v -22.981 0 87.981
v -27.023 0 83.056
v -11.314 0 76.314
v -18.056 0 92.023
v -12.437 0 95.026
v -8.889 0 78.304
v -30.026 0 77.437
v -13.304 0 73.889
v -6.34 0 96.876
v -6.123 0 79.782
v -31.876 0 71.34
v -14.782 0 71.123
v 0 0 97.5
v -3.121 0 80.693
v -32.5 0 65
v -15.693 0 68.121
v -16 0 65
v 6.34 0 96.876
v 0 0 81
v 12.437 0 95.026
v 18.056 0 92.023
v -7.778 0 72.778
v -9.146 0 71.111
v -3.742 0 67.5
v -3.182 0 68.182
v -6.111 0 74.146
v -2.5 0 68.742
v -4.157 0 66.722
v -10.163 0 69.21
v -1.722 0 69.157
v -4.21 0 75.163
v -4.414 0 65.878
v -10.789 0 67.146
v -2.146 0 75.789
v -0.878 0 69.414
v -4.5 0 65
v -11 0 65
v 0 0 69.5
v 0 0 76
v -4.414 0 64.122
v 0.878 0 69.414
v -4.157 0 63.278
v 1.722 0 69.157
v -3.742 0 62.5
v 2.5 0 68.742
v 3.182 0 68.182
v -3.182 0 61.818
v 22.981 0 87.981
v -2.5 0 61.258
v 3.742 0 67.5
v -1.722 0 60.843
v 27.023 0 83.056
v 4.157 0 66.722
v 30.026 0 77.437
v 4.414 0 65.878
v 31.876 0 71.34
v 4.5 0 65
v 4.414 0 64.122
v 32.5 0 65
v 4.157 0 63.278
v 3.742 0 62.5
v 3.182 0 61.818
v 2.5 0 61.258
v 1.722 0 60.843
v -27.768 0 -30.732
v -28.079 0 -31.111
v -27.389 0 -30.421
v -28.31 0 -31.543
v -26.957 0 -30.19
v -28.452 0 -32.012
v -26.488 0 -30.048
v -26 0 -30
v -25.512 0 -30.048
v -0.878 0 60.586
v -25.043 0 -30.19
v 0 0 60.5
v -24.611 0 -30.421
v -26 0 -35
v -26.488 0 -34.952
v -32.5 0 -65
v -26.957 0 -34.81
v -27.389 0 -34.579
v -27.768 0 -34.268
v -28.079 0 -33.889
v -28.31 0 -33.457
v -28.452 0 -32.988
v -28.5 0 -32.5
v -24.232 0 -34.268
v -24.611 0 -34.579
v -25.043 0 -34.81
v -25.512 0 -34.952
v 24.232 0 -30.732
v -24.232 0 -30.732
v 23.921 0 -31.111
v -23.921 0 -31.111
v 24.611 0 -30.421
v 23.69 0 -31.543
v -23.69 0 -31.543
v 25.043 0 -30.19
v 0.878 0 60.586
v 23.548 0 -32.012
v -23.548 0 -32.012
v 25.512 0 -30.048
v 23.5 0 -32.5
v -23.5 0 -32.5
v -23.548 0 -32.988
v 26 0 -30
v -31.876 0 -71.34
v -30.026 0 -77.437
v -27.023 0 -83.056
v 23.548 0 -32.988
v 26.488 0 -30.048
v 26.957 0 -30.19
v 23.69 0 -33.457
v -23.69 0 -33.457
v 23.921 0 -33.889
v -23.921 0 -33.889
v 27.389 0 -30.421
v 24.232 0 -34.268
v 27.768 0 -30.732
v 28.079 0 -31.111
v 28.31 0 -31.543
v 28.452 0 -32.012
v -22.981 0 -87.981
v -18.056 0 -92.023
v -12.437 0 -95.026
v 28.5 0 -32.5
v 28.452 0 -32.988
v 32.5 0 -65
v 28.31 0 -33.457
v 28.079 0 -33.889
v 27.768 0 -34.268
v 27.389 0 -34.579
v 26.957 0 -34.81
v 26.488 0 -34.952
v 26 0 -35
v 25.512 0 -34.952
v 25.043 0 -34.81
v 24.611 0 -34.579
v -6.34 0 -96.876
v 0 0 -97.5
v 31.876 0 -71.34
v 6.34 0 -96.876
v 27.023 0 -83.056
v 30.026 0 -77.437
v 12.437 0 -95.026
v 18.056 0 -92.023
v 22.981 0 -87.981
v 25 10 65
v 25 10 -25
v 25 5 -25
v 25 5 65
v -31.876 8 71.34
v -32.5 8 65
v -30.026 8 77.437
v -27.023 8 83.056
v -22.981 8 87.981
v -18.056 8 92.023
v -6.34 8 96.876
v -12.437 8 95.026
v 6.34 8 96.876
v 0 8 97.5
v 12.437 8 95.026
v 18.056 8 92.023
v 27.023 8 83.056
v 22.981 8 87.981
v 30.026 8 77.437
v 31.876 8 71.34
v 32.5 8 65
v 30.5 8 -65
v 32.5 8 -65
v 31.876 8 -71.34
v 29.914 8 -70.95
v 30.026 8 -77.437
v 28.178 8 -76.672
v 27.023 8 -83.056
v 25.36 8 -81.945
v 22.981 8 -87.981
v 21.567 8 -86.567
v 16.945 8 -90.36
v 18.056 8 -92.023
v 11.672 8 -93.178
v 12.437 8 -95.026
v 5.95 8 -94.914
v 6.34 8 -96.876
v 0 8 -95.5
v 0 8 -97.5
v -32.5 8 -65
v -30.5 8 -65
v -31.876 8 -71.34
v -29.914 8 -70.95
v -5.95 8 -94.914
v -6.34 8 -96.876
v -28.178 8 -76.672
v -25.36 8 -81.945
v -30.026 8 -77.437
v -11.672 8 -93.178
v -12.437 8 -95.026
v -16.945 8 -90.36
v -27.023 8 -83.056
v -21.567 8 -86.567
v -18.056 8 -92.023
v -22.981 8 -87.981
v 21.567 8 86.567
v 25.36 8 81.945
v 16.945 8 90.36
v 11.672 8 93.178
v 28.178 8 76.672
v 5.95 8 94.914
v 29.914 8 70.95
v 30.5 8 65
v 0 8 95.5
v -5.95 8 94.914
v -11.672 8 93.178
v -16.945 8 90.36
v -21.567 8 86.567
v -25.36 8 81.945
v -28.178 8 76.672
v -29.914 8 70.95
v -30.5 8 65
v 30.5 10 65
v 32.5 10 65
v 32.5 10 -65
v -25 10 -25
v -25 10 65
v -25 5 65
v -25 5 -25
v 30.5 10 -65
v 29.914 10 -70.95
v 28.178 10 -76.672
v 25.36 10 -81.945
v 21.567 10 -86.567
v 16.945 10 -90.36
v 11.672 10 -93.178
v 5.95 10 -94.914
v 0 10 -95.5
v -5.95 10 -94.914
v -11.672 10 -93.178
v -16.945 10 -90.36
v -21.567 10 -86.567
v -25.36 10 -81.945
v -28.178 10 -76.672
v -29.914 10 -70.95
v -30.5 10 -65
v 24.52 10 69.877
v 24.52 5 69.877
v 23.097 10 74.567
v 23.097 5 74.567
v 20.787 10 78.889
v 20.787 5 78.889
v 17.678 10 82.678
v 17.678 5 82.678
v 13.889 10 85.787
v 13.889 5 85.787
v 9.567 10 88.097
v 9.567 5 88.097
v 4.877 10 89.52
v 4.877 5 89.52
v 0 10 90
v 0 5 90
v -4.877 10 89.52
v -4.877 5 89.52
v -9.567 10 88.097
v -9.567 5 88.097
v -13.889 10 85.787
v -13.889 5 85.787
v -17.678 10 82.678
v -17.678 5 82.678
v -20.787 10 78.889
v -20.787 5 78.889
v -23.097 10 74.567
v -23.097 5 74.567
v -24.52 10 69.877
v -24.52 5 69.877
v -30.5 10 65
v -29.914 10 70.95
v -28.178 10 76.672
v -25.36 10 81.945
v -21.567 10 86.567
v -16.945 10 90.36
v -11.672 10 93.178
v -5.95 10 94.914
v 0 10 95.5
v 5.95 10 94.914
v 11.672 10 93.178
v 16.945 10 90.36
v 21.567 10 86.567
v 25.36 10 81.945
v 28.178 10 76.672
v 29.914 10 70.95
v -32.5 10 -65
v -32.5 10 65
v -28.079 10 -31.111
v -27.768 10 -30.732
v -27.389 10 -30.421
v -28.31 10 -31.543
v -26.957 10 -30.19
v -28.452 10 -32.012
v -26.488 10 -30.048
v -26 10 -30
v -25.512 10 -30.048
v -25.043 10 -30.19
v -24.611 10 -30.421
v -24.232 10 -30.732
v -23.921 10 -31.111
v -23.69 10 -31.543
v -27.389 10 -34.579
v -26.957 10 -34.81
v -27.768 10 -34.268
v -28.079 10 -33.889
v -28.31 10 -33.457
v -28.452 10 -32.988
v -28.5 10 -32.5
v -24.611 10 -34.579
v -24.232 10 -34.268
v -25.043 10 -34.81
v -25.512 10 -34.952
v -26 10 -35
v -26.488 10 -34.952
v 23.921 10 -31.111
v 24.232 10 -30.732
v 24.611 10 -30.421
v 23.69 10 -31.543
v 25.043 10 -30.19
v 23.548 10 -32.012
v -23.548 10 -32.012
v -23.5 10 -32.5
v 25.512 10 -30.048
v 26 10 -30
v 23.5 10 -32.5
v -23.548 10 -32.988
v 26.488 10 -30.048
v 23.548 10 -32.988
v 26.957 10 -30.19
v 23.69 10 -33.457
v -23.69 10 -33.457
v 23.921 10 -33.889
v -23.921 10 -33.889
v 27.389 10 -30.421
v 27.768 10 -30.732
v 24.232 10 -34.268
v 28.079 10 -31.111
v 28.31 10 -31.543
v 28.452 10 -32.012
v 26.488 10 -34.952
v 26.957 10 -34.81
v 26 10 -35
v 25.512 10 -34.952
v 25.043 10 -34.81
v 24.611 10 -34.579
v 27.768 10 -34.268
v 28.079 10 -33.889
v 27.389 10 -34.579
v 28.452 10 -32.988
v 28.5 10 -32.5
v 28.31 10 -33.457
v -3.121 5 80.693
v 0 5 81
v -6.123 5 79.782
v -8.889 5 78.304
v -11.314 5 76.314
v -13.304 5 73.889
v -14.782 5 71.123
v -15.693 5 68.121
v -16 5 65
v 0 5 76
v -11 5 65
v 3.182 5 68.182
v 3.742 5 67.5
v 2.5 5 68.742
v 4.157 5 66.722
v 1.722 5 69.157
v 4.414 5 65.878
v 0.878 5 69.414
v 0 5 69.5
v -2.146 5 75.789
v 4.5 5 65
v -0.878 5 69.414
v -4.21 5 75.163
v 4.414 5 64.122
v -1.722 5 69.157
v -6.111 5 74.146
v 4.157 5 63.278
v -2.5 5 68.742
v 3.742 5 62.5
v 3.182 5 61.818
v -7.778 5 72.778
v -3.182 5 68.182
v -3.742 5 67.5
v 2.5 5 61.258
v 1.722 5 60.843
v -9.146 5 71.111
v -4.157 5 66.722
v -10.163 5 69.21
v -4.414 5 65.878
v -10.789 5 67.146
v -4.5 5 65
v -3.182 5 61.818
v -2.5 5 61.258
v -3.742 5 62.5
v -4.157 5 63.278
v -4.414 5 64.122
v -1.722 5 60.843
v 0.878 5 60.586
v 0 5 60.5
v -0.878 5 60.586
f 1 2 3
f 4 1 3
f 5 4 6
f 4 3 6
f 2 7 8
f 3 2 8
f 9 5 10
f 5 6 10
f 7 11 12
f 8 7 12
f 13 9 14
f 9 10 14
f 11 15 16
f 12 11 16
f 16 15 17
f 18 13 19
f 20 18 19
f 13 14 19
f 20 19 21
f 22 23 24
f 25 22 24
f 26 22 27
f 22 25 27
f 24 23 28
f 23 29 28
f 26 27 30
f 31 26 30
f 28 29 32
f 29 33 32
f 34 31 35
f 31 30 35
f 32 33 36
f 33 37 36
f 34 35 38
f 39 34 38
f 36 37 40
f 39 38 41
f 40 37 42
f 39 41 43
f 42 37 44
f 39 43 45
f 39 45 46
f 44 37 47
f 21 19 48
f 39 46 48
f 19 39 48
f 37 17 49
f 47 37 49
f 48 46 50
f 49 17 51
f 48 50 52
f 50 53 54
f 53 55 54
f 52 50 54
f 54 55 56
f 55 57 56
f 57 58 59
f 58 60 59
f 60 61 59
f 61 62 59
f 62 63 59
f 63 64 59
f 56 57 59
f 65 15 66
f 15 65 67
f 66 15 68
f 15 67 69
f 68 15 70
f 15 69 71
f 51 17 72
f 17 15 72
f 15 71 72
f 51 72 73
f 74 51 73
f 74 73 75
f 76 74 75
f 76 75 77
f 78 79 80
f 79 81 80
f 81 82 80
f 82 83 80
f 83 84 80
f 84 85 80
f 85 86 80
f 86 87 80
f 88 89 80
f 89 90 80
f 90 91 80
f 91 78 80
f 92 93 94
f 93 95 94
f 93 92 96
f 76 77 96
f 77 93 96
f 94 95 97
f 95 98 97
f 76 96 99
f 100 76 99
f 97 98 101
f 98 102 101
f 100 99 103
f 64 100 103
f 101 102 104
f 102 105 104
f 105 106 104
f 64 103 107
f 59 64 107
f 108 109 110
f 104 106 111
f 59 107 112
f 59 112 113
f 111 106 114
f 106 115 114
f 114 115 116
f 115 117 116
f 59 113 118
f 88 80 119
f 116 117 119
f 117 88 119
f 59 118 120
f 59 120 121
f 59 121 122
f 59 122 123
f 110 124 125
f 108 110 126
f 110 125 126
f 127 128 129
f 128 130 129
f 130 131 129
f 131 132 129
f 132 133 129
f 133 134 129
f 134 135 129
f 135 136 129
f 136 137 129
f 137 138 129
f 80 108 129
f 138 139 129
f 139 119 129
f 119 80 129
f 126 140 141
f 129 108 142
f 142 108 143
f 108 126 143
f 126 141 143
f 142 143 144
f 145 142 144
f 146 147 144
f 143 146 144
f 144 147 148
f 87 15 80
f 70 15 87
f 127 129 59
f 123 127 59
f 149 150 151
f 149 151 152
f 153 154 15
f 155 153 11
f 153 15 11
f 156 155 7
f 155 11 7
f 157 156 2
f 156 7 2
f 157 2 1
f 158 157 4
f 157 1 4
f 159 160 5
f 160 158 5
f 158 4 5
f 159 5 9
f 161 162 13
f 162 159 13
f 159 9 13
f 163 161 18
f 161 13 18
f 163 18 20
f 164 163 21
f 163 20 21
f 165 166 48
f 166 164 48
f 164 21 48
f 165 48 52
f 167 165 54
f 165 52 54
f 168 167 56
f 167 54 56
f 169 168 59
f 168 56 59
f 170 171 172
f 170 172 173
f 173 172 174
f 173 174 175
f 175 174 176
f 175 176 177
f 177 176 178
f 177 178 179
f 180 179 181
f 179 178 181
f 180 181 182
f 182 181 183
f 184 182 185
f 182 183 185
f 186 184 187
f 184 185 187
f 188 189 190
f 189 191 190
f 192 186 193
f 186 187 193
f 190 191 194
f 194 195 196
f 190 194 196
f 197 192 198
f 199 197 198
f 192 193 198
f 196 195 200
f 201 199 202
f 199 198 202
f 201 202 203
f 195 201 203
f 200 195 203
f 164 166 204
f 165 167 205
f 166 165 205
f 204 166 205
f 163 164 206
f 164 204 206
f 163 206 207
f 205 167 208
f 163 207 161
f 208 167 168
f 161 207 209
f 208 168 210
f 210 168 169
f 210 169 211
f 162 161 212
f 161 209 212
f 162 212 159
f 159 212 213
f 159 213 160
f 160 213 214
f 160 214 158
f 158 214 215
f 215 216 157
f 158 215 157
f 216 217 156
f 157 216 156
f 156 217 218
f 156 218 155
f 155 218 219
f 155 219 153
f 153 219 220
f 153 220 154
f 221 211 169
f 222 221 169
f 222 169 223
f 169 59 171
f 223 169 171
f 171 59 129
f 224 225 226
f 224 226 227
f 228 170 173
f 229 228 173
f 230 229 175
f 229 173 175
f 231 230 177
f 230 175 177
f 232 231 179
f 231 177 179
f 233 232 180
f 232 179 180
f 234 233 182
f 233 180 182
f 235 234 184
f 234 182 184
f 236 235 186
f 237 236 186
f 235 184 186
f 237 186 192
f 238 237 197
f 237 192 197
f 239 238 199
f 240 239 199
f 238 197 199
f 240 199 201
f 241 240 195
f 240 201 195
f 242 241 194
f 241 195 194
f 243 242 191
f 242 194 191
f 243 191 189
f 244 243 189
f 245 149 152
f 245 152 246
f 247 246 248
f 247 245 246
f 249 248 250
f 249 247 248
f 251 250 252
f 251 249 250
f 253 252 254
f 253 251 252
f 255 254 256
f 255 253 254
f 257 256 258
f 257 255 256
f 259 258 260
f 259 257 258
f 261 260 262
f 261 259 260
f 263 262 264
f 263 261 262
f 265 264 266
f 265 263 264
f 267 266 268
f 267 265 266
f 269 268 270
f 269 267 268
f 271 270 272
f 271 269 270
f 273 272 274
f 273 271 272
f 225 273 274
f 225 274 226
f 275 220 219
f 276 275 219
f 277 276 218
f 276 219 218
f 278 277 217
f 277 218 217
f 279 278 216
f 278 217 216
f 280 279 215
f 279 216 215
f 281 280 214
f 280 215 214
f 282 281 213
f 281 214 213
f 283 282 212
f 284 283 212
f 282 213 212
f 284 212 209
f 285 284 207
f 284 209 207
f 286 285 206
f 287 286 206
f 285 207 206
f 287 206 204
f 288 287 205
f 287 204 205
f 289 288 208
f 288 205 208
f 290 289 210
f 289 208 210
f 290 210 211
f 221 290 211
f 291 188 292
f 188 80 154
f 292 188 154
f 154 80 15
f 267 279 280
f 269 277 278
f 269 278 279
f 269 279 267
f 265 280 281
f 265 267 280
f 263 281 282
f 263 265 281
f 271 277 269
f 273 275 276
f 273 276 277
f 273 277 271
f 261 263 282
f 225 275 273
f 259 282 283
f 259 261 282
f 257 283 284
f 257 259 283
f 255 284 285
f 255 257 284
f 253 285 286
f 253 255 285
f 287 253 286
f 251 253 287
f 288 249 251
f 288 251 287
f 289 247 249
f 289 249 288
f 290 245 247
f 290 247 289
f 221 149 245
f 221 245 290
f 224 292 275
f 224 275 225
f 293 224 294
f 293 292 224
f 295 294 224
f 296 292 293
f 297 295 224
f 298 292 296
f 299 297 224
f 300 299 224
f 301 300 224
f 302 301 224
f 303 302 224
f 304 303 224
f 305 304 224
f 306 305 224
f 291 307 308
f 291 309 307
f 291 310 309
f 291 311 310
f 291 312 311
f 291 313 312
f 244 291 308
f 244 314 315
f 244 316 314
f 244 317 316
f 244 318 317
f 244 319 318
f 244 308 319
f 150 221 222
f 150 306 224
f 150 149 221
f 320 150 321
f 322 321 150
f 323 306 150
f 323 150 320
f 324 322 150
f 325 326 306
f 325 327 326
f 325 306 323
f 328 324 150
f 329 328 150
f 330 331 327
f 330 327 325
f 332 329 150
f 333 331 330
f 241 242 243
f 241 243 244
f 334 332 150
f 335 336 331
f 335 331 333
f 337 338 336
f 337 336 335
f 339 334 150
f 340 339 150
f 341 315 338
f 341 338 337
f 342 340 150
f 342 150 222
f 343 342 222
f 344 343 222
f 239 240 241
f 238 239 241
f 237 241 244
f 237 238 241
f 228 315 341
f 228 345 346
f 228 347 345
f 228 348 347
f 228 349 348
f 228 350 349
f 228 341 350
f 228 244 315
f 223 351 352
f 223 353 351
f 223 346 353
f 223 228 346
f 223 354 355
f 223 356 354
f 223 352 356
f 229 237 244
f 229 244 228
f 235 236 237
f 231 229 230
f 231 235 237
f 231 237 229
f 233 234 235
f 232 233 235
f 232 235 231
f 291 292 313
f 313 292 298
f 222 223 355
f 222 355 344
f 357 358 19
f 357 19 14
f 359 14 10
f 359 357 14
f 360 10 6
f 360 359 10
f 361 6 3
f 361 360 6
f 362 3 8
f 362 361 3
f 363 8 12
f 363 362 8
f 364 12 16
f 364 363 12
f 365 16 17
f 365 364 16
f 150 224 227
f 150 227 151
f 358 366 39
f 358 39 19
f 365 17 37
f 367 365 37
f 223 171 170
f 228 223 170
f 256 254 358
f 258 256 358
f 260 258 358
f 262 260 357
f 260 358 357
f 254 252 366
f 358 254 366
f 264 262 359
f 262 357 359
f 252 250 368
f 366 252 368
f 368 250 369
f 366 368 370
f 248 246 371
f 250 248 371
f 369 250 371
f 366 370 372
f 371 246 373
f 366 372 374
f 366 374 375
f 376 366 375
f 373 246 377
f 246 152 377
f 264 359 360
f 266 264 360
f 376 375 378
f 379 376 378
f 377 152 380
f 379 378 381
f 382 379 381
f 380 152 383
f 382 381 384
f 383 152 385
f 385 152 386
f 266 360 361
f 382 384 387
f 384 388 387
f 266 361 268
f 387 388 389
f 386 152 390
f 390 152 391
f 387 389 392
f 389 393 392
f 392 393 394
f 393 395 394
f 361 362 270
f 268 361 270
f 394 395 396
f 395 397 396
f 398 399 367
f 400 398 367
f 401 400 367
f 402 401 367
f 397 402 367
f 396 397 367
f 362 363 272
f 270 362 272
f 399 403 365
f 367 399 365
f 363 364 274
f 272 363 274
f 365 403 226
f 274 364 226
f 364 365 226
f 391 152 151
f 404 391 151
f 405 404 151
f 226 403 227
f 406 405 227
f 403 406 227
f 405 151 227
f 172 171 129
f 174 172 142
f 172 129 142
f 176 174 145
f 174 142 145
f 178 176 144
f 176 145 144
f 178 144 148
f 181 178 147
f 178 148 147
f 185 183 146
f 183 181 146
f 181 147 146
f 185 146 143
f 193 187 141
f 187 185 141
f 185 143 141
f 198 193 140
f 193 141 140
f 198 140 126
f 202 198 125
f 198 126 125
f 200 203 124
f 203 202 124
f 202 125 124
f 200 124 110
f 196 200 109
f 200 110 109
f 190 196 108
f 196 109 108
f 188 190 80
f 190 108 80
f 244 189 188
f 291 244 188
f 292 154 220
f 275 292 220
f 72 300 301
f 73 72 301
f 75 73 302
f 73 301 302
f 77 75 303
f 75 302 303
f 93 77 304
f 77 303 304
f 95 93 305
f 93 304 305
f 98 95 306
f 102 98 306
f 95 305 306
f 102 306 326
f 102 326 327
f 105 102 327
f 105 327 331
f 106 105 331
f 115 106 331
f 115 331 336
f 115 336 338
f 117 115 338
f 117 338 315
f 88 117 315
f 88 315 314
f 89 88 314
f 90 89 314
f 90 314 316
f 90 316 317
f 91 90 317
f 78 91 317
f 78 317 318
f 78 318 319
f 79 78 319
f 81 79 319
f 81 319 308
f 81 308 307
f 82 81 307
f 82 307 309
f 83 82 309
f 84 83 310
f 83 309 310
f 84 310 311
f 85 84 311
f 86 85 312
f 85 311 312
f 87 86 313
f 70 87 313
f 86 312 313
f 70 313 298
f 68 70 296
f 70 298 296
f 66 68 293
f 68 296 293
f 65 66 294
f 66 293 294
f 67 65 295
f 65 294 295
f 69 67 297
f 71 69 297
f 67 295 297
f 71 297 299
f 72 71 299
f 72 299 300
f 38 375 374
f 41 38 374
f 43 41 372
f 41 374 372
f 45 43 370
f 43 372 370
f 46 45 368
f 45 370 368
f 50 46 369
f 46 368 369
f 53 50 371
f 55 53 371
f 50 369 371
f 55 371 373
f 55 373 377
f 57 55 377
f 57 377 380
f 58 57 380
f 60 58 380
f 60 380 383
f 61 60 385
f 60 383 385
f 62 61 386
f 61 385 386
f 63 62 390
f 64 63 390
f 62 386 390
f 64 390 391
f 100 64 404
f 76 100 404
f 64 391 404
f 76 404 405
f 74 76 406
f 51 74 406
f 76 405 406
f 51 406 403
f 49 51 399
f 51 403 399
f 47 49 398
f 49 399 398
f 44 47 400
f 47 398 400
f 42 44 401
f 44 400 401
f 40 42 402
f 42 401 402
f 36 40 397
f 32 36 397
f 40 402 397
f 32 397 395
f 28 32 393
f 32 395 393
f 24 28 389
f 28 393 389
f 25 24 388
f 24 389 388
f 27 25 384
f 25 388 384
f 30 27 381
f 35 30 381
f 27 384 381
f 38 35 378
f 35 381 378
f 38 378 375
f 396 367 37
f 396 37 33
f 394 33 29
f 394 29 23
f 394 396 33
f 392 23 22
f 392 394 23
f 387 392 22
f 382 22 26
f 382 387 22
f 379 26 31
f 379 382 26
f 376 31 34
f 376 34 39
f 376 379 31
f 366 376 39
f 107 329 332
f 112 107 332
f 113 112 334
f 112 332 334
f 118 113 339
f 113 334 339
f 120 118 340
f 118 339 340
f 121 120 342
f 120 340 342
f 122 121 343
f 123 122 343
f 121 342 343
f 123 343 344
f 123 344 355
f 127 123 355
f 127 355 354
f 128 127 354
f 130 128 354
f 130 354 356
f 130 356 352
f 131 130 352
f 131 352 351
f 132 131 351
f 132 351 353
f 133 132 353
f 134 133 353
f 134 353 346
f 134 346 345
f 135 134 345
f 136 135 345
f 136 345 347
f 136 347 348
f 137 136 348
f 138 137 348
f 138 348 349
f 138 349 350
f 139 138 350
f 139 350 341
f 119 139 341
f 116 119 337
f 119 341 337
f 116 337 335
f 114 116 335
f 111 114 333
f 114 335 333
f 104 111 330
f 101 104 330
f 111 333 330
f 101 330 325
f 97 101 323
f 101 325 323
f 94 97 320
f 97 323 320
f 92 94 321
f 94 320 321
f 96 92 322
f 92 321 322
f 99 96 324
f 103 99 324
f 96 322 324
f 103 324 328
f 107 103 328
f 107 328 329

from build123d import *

# Parameters (mm, degrees)
BOSS_EXTRUDE1_DEPTH = 10
CUT_EXTRUDE4_DEPTH  = 5
SKETCH7_R           = 4.5
CUT_EXTRUDE5_DEPTH  = 5
CUT_EXTRUDE6_DEPTH  = 10
CUT_EXTRUDE7_START  = -2
CUT_EXTRUDE7_DEPTH  = 2
SKETCH11_R          = 2.5
CUT_EXTRUDE8_DEPTH  = 104.25938214


with BuildPart() as part:
    # Sketch1 → Boss-Extrude1 (new body)
    with BuildSketch(Plane(origin=(0, 0, 0), x_dir=(1, 0, 0), z_dir=(0, 1, 0))):
        with BuildLine():
            Line((-32.5, 65), (-32.5, -65))
            ThreePointArc((-32.5, -65), (0, -97.5), (32.5, -65))
            Line((32.5, -65), (32.5, 65))
            ThreePointArc((32.5, 65), (0, 97.5), (-32.5, 65))
        make_face()
    extrude(amount=BOSS_EXTRUDE1_DEPTH)

    # Sketch6 → Cut-Extrude4 (cut)
    with BuildSketch(Plane(origin=(0, 10, 0), x_dir=(1, 0, 0), z_dir=(0, 1, 0))):
        with BuildLine():
            Line((-25, -65), (-25, 25))
            Line((-25, 25), (25, 25))
            Line((25, 25), (25, -65))
            ThreePointArc((25, -65), (0, -90), (-25, -65))
        make_face()
    extrude(amount=-CUT_EXTRUDE4_DEPTH, mode=Mode.SUBTRACT)

    # Sketch7 → Cut-Extrude5 (cut)
    with BuildSketch(Plane(origin=(0, 5, 0), x_dir=(1, 0, 0), z_dir=(0, 1, 0))):
        with Locations(Location((0, -65, 0), (0, 0, 270))):
            Circle(SKETCH7_R)
    extrude(amount=-CUT_EXTRUDE5_DEPTH, mode=Mode.SUBTRACT)

    # Sketch8 → Cut-Extrude6 (cut)
    with BuildSketch(Plane(origin=(0, 5, 0), x_dir=(1, 0, 0), z_dir=(0, 1, 0))):
        with BuildLine():
            Line((-16, -65), (-11, -65))
            ThreePointArc((-11, -65), (-7.778174593, -72.778174593), (0, -76))
            Line((0, -76), (0, -81))
            ThreePointArc((0, -81), (-11.313708499, -76.313708499), (-16, -65))
        make_face()
    extrude(amount=-CUT_EXTRUDE6_DEPTH, mode=Mode.SUBTRACT)

    # Sketch9 → Cut-Extrude7 (cut)
    with BuildSketch(Plane(origin=(0, 10, 0), x_dir=(1, 0, 0), z_dir=(0, 1, 0)).offset(CUT_EXTRUDE7_START)):
        with BuildLine():
            Line((-32.5, -65), (-30.5, -65))
            ThreePointArc((-30.5, -65), (0, -95.5), (30.5, -65))
            Line((30.5, -65), (32.5, -65))
            ThreePointArc((32.5, -65), (0, -97.5), (-32.5, -65))
        make_face()
        with BuildLine():
            Line((-30.5, 65), (-32.5, 65))
            ThreePointArc((-32.5, 65), (0, 97.5), (32.5, 65))
            Line((32.5, 65), (30.5, 65))
            ThreePointArc((30.5, 65), (0, 95.5), (-30.5, 65))
        make_face()
    extrude(amount=CUT_EXTRUDE7_DEPTH, mode=Mode.SUBTRACT)

    # Sketch11 → Cut-Extrude8 (cut, through all)
    with BuildSketch(Plane(origin=(0, 10, 0), x_dir=(1, 0, 0), z_dir=(0, 1, 0))):
        with Locations(Location((26, 32.5, 0), (0, 0, 270))):
            Circle(SKETCH11_R)
        with Locations(Location((-26, 32.5, 0), (0, 0, 270))):
            Circle(SKETCH11_R)
    extrude(amount=-CUT_EXTRUDE8_DEPTH, mode=Mode.SUBTRACT)


solid = part.part
